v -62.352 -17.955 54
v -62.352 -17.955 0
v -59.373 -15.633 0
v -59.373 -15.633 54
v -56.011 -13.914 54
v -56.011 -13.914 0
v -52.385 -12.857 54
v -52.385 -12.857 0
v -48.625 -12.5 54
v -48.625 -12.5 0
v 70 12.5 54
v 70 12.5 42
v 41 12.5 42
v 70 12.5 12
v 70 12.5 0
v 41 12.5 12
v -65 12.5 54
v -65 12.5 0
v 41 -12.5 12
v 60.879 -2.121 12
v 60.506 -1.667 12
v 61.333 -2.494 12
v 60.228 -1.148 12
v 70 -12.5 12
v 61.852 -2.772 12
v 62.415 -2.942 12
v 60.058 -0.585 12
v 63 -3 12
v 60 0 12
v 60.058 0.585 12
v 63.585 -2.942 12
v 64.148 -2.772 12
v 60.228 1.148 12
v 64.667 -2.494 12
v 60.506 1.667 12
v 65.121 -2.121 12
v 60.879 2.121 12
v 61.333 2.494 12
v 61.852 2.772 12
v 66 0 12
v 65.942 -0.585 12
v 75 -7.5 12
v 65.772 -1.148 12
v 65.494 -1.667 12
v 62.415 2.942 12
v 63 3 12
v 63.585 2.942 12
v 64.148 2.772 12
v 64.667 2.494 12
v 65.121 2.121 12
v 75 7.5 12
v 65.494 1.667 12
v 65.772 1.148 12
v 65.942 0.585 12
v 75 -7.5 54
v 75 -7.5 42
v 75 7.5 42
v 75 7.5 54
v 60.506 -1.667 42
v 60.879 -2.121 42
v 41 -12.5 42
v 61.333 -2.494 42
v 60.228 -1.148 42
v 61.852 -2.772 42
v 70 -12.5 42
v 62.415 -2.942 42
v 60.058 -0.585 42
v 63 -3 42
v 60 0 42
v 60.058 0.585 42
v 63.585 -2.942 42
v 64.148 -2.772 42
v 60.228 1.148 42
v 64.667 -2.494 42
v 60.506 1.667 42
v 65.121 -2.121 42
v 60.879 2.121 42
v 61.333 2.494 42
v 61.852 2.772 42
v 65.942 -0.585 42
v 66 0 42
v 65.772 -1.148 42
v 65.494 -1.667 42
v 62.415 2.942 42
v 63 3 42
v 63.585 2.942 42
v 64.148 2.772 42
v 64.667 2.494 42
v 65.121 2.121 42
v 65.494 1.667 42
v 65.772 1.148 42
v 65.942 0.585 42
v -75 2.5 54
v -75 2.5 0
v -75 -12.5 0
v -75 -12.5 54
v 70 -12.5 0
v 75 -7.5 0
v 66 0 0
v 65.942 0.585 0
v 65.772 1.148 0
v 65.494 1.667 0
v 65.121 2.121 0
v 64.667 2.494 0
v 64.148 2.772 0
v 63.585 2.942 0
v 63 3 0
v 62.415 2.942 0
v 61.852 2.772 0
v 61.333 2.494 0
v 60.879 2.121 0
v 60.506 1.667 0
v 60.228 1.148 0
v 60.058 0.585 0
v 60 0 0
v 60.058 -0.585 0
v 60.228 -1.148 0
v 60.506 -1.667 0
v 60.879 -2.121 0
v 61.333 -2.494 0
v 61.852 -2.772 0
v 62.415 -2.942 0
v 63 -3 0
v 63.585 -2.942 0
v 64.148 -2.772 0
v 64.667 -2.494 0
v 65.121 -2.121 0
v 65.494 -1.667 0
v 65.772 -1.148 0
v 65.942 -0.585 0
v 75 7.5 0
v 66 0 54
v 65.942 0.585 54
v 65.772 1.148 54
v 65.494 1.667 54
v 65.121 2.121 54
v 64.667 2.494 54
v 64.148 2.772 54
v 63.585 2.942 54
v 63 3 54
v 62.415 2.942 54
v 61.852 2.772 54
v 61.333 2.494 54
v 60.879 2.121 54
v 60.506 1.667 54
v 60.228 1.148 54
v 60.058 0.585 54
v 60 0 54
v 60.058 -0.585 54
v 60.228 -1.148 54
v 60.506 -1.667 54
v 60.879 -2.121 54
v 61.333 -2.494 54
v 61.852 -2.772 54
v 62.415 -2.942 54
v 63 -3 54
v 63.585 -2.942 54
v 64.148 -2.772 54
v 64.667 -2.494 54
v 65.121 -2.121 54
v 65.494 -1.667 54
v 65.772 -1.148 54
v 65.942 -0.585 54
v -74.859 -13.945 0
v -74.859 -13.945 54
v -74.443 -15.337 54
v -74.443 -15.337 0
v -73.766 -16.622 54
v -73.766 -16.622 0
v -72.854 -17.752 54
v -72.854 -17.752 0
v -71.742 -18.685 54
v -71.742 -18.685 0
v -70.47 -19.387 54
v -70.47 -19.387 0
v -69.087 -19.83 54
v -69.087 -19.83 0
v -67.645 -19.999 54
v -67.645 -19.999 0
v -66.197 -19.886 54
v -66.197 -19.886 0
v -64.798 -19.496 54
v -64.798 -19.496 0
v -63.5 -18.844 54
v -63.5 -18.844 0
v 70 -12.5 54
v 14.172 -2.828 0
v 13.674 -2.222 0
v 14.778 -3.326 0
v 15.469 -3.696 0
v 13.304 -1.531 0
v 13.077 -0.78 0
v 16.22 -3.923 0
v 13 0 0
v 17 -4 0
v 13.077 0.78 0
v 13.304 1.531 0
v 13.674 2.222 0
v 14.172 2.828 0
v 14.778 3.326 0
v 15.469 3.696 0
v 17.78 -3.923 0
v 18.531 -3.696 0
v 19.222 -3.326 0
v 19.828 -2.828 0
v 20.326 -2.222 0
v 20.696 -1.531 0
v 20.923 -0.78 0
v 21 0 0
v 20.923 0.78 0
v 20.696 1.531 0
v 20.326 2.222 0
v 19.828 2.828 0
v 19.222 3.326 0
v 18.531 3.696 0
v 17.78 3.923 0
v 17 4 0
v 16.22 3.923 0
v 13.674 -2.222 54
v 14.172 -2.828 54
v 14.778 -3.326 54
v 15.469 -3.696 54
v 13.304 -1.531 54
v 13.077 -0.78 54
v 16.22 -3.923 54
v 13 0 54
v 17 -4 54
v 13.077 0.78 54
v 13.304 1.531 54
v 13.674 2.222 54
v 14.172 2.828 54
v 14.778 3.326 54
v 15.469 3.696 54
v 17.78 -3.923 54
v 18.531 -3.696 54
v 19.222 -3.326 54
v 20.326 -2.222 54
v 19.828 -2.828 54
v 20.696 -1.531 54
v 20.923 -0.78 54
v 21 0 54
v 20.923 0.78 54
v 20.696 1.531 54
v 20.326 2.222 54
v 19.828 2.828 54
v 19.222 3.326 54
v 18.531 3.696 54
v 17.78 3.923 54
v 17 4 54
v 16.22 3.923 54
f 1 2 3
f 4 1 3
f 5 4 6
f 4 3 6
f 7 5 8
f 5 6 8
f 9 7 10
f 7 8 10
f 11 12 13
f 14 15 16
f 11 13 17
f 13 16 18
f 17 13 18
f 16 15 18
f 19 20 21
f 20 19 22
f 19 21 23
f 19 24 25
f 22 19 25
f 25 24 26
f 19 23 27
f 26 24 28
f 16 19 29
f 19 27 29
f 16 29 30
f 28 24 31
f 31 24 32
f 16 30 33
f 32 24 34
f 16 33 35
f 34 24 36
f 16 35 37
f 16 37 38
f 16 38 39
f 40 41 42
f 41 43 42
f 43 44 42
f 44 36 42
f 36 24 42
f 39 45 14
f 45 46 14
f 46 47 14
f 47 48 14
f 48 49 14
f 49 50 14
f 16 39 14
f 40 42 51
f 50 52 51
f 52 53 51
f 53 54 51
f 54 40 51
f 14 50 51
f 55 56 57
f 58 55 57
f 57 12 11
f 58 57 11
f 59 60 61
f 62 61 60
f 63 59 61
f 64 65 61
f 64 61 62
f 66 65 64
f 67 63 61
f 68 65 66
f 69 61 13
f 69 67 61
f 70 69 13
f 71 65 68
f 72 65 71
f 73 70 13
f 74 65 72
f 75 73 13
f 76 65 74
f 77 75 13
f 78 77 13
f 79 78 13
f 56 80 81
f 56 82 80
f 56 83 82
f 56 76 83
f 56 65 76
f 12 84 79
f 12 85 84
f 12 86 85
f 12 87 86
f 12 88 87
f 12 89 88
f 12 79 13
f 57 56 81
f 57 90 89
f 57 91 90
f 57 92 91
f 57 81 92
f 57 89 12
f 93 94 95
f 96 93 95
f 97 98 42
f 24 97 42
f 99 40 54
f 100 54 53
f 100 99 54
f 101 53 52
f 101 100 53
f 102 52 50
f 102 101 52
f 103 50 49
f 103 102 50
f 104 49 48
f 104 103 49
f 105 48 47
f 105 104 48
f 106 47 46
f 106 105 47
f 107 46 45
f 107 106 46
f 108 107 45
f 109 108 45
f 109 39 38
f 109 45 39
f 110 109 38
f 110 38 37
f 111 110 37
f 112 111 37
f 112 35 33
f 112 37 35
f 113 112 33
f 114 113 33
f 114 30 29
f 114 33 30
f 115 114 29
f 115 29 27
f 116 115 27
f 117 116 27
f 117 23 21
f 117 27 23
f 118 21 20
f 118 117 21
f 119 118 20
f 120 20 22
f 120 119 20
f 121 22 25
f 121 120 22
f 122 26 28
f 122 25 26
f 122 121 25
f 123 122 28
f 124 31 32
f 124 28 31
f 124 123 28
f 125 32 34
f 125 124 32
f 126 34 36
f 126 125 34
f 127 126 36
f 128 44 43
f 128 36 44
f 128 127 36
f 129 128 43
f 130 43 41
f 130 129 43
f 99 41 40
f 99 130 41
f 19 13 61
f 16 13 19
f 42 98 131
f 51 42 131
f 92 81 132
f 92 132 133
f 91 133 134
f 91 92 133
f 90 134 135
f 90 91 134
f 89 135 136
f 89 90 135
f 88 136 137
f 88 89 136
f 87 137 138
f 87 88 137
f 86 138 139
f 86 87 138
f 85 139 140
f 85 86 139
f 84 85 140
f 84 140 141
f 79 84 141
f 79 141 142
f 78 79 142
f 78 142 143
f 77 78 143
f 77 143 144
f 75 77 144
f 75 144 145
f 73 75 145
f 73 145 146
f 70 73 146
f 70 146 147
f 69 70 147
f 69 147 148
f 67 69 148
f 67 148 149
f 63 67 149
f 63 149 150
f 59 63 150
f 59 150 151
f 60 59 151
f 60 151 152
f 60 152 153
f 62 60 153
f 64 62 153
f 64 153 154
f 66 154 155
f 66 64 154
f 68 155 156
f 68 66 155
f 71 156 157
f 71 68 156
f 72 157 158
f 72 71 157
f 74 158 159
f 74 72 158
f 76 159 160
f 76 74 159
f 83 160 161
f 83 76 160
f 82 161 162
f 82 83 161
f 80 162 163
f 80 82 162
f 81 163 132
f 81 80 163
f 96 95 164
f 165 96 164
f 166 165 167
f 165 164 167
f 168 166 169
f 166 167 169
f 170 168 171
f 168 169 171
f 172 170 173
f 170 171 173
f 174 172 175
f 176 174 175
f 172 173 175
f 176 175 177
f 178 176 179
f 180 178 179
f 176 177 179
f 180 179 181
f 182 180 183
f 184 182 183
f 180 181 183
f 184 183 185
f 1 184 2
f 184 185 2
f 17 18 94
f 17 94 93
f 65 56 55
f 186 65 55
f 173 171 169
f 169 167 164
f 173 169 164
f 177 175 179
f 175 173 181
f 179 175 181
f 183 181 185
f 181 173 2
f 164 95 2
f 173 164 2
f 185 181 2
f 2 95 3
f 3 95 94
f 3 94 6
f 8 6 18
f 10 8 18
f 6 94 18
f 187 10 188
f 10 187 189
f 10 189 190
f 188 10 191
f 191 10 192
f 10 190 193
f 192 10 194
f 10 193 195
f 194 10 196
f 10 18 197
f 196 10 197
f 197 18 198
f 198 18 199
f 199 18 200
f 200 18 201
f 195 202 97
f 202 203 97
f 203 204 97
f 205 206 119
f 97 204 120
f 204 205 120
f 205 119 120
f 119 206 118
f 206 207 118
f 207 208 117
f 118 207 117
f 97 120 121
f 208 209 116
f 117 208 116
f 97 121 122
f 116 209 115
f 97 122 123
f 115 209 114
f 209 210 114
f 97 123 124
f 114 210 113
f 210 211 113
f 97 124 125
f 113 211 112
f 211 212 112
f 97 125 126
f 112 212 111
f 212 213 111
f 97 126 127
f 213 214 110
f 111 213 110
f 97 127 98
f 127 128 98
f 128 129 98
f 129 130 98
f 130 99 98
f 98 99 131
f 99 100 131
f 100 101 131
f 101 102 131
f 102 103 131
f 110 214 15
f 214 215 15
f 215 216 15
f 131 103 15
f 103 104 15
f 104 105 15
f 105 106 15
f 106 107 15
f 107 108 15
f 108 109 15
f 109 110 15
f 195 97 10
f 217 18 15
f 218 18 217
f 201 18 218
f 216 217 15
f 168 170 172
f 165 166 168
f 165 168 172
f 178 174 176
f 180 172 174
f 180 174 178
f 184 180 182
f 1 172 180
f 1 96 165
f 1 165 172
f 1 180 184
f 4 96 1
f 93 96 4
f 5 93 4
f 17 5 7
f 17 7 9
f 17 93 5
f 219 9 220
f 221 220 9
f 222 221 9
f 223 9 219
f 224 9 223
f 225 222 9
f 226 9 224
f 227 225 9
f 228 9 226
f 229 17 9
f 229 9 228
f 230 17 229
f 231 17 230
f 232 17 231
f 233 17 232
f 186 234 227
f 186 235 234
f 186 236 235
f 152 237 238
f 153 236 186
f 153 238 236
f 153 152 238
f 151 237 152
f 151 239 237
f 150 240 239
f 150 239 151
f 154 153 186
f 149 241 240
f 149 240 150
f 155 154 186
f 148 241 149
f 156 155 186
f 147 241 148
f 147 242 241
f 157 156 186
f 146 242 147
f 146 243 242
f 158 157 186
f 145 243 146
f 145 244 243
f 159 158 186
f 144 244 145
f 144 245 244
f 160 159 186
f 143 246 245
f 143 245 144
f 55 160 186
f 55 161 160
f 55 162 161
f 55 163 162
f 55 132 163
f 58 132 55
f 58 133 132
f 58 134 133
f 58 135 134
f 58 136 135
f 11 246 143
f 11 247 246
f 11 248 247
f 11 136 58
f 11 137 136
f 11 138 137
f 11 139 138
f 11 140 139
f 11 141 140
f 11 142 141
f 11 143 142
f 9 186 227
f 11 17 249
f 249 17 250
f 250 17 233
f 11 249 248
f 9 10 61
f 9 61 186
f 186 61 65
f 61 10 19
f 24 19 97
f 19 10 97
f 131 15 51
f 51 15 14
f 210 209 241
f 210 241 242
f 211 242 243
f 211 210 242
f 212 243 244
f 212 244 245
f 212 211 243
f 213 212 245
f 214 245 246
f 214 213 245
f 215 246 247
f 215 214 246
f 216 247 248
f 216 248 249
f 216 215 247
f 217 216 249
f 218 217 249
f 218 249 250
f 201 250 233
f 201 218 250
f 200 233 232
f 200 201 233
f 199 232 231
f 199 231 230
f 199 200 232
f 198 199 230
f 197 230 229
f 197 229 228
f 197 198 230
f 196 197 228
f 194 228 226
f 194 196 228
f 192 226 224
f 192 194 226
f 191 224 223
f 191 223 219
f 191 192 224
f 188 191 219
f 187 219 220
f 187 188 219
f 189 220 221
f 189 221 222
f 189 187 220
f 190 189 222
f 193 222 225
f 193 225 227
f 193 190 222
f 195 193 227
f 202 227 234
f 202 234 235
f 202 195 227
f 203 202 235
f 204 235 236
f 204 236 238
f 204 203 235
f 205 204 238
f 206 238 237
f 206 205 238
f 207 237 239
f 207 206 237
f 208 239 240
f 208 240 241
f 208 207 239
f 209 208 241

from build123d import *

# Parameters (mm, degrees)
SCHIZZO1_R                   = 3
SCHIZZO1_R_2                 = 4
ESTRUSIONE_ESTRUSIONE1_DEPTH = 54
SCHIZZO2_W                   = 30
SCHIZZO2_H                   = 25
TAGLIO_ESTRUSIONE1_DEPTH     = 34
SMUSSO1_SIZE                 = 5
SMUSSO2_SIZE                 = 10


with BuildPart() as part:
    # Schizzo1 → Estrusione-Estrusione1 (new body)
    with BuildSketch(Plane.XY):
        with BuildLine():
            Line((-48.625413912, -12.5), (75, -12.5))
            Line((75, -12.5), (75, 12.5))
            Line((75, 12.5), (-75, 12.5))
            Line((-75, 12.5), (-75, -12.5))
            ThreePointArc((-75, -12.5), (-70.470091926, -19.386839185), (-62.352385612, -17.954545455))
            ThreePointArc((-62.352385612, -17.954545455), (-56.010903371, -13.913592454), (-48.625413912, -12.5))
        make_face()
        with Locations((63, 0)):
            Circle(SCHIZZO1_R, mode=Mode.SUBTRACT)
        with Locations((17, 0)):
            Circle(SCHIZZO1_R_2, mode=Mode.SUBTRACT)
    extrude(amount=ESTRUSIONE_ESTRUSIONE1_DEPTH)

    # Schizzo2 → Taglio-Estrusione1 (cut)
    with BuildSketch(Plane(origin=(75, 0, 0), x_dir=(0, 0, -1), z_dir=(1, 0, 0))):
        with Locations((-27, 0)):
            Rectangle(SCHIZZO2_W, SCHIZZO2_H)
    extrude(amount=-TAGLIO_ESTRUSIONE1_DEPTH, mode=Mode.SUBTRACT)

    # Smusso1
    smusso1_edges = [part.edges().sort_by_distance(p)[0] for p in [
        (75, -12.5, 48),
        (75, 12.5, 48),
        (75, -12.5, 6),
        (75, 12.5, 6),
    ]]
    chamfer(smusso1_edges, length=SMUSSO1_SIZE)

    # Smusso2
    smusso2_edges = [part.edges().sort_by_distance(p)[0] for p in [
        (-75, 12.5, 27),
    ]]
    chamfer(smusso2_edges, length=SMUSSO2_SIZE)


solid = part.part
